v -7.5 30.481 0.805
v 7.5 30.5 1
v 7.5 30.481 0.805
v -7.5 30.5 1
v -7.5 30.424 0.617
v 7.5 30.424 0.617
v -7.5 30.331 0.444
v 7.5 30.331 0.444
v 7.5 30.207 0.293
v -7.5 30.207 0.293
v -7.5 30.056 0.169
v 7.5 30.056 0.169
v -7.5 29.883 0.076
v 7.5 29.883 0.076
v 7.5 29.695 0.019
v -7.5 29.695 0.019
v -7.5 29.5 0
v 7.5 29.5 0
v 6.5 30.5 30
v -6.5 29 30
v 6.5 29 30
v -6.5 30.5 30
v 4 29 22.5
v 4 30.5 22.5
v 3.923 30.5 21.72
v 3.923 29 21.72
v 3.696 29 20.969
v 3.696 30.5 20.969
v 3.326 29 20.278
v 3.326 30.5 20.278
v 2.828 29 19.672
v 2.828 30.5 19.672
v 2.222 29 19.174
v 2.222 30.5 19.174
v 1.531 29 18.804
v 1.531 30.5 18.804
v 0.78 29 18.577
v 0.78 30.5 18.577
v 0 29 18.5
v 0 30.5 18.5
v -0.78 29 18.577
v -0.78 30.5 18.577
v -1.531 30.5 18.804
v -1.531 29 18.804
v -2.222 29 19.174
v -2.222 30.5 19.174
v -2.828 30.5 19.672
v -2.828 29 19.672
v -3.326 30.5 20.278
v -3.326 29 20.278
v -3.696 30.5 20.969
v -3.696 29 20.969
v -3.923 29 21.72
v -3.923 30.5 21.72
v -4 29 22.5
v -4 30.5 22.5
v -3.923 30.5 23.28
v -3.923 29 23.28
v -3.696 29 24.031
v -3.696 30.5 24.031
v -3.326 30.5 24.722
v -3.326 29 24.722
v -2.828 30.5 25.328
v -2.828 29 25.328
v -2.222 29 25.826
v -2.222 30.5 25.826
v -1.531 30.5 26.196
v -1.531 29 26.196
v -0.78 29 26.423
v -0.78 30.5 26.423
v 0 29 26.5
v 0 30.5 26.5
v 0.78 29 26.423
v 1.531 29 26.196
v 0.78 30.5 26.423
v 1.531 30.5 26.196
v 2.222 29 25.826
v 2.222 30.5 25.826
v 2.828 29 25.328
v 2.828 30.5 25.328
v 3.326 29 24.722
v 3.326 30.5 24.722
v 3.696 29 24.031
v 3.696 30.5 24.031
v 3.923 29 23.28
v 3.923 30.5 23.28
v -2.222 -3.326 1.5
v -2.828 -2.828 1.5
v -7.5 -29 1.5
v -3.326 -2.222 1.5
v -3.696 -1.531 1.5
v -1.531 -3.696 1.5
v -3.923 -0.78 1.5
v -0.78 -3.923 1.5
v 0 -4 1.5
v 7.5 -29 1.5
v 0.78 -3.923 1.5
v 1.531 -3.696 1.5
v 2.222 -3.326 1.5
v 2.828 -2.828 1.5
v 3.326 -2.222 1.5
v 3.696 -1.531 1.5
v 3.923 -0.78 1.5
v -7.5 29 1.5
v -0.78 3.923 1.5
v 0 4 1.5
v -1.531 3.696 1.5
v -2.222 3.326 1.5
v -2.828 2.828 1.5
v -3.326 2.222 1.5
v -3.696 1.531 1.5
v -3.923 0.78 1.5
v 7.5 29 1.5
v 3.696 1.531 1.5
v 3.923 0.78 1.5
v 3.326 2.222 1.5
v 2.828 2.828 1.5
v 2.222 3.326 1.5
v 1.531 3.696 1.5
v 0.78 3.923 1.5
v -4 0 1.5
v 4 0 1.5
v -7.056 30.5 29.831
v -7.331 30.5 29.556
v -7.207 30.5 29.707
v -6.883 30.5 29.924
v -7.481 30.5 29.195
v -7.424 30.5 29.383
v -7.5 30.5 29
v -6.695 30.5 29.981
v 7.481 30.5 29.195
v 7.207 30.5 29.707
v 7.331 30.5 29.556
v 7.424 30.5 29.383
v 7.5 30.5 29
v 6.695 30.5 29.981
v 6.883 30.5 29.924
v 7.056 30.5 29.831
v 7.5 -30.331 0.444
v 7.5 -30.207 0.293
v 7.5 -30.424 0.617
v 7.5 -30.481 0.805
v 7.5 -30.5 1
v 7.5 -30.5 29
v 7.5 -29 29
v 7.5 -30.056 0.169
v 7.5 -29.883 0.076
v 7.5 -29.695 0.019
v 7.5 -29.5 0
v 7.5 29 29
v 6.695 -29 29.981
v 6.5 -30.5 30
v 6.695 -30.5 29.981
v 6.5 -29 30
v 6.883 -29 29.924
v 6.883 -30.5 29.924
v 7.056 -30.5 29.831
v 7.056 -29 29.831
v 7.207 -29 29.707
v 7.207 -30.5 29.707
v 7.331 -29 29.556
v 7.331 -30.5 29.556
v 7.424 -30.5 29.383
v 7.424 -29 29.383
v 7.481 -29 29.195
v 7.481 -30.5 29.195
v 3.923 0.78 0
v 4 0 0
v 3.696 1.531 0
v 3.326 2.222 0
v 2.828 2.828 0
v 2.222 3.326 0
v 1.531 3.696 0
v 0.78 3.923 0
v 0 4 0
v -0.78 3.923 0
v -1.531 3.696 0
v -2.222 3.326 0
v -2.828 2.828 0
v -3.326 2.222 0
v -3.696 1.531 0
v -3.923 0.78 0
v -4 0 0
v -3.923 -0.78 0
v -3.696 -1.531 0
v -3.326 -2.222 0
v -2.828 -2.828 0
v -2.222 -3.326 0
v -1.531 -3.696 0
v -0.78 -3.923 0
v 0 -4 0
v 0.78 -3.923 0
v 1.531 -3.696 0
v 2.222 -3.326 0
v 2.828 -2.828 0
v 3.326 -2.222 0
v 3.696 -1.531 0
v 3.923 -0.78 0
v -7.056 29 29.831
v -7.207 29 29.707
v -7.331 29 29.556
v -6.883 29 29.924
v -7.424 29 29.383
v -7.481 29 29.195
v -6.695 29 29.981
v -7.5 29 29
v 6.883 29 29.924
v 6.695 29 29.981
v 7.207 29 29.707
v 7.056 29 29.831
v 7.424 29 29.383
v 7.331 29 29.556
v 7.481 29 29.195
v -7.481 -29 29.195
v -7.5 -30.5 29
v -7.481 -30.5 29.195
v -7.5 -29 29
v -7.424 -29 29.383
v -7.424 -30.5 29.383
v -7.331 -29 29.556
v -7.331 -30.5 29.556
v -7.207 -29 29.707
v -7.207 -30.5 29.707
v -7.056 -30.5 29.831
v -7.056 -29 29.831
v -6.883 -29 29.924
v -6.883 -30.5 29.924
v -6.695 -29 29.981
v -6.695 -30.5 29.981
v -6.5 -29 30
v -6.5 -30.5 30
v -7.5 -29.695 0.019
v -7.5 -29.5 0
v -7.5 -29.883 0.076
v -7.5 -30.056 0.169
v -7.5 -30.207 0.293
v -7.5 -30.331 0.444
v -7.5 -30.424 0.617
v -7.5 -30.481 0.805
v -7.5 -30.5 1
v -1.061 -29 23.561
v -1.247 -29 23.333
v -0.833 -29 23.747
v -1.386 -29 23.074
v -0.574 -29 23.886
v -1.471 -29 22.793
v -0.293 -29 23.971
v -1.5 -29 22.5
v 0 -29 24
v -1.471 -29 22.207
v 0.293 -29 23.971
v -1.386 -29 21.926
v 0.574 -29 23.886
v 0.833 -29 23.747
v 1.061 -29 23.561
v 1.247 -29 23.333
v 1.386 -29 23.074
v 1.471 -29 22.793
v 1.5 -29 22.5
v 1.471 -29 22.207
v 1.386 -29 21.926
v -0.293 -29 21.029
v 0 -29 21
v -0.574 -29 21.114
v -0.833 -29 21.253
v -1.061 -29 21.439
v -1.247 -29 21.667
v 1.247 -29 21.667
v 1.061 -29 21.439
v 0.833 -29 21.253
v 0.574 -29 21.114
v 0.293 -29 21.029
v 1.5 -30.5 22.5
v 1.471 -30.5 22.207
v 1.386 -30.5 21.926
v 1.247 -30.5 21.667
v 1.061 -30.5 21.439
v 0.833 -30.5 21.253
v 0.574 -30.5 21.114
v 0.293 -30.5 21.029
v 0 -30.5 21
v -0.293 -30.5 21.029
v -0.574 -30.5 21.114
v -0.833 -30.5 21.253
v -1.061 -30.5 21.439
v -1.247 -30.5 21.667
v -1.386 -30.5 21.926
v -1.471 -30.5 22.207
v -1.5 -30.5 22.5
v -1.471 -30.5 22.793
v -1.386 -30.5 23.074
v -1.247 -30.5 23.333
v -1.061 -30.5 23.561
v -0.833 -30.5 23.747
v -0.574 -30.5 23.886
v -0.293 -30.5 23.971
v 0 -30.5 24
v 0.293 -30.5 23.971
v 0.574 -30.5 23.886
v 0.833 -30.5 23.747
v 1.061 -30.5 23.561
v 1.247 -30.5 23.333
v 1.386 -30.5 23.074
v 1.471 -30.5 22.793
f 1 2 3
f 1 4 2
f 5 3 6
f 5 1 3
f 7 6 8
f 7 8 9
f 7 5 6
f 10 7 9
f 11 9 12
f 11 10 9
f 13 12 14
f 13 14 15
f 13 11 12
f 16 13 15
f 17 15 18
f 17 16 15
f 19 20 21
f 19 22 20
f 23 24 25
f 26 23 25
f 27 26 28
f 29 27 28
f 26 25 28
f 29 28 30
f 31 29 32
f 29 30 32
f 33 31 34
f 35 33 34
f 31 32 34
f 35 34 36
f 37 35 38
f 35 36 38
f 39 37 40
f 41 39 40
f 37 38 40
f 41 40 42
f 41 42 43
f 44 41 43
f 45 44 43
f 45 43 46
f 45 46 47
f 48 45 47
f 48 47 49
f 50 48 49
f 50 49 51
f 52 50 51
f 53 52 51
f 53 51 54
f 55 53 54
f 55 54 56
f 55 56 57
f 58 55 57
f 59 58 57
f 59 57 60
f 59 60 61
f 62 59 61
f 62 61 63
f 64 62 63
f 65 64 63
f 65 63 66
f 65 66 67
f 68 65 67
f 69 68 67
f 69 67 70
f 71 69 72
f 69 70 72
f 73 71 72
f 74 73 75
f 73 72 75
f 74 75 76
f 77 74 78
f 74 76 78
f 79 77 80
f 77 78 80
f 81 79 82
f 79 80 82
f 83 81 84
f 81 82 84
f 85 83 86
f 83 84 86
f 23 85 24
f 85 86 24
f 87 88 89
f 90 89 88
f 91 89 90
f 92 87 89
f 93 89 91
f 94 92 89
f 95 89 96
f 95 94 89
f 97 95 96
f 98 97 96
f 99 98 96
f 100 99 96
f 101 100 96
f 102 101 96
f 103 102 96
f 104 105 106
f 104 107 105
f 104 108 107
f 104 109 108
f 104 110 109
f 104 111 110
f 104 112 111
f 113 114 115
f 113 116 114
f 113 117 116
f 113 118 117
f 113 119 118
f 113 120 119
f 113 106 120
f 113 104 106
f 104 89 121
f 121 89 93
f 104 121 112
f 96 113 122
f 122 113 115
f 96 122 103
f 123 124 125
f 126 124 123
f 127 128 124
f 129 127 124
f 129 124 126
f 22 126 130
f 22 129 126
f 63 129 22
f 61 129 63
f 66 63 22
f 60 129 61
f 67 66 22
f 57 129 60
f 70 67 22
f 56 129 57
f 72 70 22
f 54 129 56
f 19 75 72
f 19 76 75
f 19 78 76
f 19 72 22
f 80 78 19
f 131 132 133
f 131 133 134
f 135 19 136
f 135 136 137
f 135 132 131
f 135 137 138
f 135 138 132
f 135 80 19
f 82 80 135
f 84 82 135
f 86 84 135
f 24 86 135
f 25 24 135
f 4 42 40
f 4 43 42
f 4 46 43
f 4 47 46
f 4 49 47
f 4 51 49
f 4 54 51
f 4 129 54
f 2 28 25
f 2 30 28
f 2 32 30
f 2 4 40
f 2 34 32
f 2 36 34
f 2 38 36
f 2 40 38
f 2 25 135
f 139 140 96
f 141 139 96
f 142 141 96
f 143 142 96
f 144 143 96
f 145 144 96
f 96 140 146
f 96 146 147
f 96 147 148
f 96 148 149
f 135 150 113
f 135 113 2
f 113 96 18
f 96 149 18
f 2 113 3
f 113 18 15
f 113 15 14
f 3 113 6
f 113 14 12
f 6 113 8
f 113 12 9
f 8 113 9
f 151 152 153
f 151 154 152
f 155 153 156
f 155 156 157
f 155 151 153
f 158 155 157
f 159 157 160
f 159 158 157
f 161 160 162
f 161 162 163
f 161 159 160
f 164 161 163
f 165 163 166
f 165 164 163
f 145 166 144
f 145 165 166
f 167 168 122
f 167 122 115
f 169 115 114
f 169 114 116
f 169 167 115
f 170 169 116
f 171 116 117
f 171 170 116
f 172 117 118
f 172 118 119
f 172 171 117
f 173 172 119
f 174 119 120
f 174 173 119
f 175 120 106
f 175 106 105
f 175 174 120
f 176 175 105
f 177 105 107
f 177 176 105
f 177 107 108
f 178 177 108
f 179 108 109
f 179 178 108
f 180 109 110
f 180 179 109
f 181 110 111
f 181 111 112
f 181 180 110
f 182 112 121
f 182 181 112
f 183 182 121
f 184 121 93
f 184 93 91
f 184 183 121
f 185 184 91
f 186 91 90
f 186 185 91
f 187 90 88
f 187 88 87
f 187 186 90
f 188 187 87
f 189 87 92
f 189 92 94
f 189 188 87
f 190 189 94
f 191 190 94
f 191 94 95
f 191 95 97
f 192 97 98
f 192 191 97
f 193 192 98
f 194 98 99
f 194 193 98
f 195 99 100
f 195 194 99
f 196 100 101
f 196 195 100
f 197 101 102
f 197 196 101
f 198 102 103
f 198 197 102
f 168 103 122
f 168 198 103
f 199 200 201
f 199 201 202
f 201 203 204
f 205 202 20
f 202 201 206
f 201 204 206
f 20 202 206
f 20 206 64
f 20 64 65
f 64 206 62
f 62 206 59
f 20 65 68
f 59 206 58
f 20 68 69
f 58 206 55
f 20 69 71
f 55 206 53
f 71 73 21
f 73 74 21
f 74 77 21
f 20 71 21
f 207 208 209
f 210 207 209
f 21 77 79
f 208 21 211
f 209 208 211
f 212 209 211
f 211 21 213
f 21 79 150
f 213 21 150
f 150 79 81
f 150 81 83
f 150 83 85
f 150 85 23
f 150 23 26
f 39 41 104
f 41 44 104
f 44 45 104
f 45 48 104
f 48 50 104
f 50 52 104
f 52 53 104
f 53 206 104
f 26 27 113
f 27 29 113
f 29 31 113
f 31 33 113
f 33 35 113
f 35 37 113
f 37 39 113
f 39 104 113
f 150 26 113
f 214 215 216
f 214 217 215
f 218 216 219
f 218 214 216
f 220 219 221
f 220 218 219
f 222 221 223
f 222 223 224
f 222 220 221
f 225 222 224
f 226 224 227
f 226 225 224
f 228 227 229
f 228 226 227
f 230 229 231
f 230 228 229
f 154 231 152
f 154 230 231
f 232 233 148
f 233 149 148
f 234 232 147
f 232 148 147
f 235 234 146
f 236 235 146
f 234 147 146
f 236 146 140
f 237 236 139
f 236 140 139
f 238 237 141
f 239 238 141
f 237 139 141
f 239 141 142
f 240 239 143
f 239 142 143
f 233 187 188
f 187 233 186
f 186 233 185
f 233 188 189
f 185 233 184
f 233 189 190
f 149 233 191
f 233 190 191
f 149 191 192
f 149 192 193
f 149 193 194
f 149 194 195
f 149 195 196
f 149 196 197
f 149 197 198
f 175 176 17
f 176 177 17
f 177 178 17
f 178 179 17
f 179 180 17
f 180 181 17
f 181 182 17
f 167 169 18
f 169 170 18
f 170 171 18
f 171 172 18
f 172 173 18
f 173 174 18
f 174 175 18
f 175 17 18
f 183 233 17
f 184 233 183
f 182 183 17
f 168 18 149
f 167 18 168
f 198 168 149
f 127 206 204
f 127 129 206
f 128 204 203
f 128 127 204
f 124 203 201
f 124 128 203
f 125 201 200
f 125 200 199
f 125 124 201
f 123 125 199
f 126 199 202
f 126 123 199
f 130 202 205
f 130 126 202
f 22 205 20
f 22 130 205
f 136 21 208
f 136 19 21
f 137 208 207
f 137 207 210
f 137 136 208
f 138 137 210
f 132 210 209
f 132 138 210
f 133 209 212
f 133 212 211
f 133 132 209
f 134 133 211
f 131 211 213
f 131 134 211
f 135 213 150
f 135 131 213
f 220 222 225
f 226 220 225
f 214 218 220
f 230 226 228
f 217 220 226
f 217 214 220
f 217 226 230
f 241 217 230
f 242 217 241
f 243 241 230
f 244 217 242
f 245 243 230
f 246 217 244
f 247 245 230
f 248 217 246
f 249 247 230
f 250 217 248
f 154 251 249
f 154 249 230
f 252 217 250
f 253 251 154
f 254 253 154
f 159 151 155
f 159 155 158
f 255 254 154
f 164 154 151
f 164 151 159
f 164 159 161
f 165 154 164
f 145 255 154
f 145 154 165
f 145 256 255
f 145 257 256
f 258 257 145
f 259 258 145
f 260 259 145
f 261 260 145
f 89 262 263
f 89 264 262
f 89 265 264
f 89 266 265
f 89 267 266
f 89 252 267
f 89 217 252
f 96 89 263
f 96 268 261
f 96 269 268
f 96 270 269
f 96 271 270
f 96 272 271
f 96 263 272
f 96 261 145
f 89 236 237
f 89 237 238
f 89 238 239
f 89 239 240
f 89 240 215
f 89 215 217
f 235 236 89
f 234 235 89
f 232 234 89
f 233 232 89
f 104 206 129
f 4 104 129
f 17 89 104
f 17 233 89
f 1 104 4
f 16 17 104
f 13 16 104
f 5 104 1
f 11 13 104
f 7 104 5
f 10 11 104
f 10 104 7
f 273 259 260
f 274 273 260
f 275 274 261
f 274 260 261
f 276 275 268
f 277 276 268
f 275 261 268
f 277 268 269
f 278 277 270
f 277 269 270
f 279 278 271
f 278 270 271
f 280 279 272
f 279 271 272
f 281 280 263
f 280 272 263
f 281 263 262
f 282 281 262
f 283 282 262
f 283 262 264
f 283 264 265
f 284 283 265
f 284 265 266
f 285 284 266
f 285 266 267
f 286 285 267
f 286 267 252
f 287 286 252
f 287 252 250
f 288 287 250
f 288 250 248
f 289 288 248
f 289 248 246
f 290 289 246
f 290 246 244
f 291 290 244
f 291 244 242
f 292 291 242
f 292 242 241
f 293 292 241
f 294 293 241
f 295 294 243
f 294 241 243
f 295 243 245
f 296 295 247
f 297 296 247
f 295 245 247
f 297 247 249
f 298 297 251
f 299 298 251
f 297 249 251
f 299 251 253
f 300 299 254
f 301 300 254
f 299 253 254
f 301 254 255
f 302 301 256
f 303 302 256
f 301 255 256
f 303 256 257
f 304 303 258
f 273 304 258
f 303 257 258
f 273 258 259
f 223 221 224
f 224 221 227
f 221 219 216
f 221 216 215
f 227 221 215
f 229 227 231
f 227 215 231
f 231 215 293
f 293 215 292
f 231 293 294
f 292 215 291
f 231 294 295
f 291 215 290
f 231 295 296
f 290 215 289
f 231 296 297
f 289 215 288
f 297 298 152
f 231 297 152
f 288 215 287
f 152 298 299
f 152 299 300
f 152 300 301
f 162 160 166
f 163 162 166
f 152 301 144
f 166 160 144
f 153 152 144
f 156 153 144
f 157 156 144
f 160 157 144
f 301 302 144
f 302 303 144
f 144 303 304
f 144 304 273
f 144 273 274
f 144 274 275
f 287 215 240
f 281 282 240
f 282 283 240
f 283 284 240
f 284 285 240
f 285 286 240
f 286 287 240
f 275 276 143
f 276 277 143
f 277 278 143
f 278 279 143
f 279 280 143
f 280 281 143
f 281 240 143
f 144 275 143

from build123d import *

# Parameters (mm, degrees)
SKETCH1_R           = 4
BOSS_EXTRUDE1_DEPTH = 1.5
SKETCH2_W           = 15
SKETCH2_H           = 1.5
BOSS_EXTRUDE2_DEPTH = 28.5
SKETCH3_R           = 1.5
CUT_EXTRUDE1_DEPTH  = 62
FILLET1_R           = 1
CUT_EXTRUDE2_REACH  = 63
SKETCH5_R           = 4


with BuildPart() as part:
    # Sketch1 → Boss-Extrude1 (new body)
    with BuildSketch(Plane.XY):
        Polygon((-7.5, -23.042592662), (-7.5, -30.5), (7.5, -30.5), (7.5, -23.042592662), (7.5, 26.84732779), (7.5, 30.5), (-7.5, 30.5), (-7.5, 26.84732779), align=None)
        Circle(SKETCH1_R, mode=Mode.SUBTRACT)
    extrude(amount=BOSS_EXTRUDE1_DEPTH)

    # Sketch2 → Boss-Extrude2 (add)
    with BuildSketch(Plane.XY.offset(1.5)):
        with Locations((0, 29.75)):
            Rectangle(SKETCH2_W, SKETCH2_H)
        with Locations((0, -29.75)):
            Rectangle(SKETCH2_W, SKETCH2_H)
    extrude(amount=BOSS_EXTRUDE2_DEPTH)

    # Sketch3 → Cut-Extrude1 (cut, through all)
    with BuildSketch(Plane(origin=(0, 30.5, 0), x_dir=(1, 0, 0), z_dir=(0, 1, 0))):
        with Locations((0, -22.5)):
            Circle(SKETCH3_R)
    extrude(amount=-CUT_EXTRUDE1_DEPTH, mode=Mode.SUBTRACT)

    # Fillet1
    fillet1_edges = [part.edges().sort_by_distance(p)[0] for p in [
        (0, -30.5, 0),
        (-7.5, -29.75, 30),
        (7.5, -29.75, 30),
        (7.5, 29.75, 30),
        (-7.5, 29.75, 30),
        (0, 30.5, 0),
    ]]
    fillet(fillet1_edges, radius=FILLET1_R)

    # Sketch5 → Cut-Extrude2 (cut, up to next)
    with BuildSketch(Plane(origin=(0, 30.5, 0), x_dir=(1, 0, 0), z_dir=(0, 1, 0)), mode=Mode.PRIVATE) as cut_extrude2_sk1:
        with Locations((0, -22.5)):
            Circle(SKETCH5_R)
    cut_extrude2_tool1 = extrude(cut_extrude2_sk1.sketch, amount=-CUT_EXTRUDE2_REACH, mode=Mode.PRIVATE) & part.part
    add(cut_extrude2_tool1.solids().sort_by_distance((0, 30.5, 22.5))[0], mode=Mode.SUBTRACT)


solid = part.part
